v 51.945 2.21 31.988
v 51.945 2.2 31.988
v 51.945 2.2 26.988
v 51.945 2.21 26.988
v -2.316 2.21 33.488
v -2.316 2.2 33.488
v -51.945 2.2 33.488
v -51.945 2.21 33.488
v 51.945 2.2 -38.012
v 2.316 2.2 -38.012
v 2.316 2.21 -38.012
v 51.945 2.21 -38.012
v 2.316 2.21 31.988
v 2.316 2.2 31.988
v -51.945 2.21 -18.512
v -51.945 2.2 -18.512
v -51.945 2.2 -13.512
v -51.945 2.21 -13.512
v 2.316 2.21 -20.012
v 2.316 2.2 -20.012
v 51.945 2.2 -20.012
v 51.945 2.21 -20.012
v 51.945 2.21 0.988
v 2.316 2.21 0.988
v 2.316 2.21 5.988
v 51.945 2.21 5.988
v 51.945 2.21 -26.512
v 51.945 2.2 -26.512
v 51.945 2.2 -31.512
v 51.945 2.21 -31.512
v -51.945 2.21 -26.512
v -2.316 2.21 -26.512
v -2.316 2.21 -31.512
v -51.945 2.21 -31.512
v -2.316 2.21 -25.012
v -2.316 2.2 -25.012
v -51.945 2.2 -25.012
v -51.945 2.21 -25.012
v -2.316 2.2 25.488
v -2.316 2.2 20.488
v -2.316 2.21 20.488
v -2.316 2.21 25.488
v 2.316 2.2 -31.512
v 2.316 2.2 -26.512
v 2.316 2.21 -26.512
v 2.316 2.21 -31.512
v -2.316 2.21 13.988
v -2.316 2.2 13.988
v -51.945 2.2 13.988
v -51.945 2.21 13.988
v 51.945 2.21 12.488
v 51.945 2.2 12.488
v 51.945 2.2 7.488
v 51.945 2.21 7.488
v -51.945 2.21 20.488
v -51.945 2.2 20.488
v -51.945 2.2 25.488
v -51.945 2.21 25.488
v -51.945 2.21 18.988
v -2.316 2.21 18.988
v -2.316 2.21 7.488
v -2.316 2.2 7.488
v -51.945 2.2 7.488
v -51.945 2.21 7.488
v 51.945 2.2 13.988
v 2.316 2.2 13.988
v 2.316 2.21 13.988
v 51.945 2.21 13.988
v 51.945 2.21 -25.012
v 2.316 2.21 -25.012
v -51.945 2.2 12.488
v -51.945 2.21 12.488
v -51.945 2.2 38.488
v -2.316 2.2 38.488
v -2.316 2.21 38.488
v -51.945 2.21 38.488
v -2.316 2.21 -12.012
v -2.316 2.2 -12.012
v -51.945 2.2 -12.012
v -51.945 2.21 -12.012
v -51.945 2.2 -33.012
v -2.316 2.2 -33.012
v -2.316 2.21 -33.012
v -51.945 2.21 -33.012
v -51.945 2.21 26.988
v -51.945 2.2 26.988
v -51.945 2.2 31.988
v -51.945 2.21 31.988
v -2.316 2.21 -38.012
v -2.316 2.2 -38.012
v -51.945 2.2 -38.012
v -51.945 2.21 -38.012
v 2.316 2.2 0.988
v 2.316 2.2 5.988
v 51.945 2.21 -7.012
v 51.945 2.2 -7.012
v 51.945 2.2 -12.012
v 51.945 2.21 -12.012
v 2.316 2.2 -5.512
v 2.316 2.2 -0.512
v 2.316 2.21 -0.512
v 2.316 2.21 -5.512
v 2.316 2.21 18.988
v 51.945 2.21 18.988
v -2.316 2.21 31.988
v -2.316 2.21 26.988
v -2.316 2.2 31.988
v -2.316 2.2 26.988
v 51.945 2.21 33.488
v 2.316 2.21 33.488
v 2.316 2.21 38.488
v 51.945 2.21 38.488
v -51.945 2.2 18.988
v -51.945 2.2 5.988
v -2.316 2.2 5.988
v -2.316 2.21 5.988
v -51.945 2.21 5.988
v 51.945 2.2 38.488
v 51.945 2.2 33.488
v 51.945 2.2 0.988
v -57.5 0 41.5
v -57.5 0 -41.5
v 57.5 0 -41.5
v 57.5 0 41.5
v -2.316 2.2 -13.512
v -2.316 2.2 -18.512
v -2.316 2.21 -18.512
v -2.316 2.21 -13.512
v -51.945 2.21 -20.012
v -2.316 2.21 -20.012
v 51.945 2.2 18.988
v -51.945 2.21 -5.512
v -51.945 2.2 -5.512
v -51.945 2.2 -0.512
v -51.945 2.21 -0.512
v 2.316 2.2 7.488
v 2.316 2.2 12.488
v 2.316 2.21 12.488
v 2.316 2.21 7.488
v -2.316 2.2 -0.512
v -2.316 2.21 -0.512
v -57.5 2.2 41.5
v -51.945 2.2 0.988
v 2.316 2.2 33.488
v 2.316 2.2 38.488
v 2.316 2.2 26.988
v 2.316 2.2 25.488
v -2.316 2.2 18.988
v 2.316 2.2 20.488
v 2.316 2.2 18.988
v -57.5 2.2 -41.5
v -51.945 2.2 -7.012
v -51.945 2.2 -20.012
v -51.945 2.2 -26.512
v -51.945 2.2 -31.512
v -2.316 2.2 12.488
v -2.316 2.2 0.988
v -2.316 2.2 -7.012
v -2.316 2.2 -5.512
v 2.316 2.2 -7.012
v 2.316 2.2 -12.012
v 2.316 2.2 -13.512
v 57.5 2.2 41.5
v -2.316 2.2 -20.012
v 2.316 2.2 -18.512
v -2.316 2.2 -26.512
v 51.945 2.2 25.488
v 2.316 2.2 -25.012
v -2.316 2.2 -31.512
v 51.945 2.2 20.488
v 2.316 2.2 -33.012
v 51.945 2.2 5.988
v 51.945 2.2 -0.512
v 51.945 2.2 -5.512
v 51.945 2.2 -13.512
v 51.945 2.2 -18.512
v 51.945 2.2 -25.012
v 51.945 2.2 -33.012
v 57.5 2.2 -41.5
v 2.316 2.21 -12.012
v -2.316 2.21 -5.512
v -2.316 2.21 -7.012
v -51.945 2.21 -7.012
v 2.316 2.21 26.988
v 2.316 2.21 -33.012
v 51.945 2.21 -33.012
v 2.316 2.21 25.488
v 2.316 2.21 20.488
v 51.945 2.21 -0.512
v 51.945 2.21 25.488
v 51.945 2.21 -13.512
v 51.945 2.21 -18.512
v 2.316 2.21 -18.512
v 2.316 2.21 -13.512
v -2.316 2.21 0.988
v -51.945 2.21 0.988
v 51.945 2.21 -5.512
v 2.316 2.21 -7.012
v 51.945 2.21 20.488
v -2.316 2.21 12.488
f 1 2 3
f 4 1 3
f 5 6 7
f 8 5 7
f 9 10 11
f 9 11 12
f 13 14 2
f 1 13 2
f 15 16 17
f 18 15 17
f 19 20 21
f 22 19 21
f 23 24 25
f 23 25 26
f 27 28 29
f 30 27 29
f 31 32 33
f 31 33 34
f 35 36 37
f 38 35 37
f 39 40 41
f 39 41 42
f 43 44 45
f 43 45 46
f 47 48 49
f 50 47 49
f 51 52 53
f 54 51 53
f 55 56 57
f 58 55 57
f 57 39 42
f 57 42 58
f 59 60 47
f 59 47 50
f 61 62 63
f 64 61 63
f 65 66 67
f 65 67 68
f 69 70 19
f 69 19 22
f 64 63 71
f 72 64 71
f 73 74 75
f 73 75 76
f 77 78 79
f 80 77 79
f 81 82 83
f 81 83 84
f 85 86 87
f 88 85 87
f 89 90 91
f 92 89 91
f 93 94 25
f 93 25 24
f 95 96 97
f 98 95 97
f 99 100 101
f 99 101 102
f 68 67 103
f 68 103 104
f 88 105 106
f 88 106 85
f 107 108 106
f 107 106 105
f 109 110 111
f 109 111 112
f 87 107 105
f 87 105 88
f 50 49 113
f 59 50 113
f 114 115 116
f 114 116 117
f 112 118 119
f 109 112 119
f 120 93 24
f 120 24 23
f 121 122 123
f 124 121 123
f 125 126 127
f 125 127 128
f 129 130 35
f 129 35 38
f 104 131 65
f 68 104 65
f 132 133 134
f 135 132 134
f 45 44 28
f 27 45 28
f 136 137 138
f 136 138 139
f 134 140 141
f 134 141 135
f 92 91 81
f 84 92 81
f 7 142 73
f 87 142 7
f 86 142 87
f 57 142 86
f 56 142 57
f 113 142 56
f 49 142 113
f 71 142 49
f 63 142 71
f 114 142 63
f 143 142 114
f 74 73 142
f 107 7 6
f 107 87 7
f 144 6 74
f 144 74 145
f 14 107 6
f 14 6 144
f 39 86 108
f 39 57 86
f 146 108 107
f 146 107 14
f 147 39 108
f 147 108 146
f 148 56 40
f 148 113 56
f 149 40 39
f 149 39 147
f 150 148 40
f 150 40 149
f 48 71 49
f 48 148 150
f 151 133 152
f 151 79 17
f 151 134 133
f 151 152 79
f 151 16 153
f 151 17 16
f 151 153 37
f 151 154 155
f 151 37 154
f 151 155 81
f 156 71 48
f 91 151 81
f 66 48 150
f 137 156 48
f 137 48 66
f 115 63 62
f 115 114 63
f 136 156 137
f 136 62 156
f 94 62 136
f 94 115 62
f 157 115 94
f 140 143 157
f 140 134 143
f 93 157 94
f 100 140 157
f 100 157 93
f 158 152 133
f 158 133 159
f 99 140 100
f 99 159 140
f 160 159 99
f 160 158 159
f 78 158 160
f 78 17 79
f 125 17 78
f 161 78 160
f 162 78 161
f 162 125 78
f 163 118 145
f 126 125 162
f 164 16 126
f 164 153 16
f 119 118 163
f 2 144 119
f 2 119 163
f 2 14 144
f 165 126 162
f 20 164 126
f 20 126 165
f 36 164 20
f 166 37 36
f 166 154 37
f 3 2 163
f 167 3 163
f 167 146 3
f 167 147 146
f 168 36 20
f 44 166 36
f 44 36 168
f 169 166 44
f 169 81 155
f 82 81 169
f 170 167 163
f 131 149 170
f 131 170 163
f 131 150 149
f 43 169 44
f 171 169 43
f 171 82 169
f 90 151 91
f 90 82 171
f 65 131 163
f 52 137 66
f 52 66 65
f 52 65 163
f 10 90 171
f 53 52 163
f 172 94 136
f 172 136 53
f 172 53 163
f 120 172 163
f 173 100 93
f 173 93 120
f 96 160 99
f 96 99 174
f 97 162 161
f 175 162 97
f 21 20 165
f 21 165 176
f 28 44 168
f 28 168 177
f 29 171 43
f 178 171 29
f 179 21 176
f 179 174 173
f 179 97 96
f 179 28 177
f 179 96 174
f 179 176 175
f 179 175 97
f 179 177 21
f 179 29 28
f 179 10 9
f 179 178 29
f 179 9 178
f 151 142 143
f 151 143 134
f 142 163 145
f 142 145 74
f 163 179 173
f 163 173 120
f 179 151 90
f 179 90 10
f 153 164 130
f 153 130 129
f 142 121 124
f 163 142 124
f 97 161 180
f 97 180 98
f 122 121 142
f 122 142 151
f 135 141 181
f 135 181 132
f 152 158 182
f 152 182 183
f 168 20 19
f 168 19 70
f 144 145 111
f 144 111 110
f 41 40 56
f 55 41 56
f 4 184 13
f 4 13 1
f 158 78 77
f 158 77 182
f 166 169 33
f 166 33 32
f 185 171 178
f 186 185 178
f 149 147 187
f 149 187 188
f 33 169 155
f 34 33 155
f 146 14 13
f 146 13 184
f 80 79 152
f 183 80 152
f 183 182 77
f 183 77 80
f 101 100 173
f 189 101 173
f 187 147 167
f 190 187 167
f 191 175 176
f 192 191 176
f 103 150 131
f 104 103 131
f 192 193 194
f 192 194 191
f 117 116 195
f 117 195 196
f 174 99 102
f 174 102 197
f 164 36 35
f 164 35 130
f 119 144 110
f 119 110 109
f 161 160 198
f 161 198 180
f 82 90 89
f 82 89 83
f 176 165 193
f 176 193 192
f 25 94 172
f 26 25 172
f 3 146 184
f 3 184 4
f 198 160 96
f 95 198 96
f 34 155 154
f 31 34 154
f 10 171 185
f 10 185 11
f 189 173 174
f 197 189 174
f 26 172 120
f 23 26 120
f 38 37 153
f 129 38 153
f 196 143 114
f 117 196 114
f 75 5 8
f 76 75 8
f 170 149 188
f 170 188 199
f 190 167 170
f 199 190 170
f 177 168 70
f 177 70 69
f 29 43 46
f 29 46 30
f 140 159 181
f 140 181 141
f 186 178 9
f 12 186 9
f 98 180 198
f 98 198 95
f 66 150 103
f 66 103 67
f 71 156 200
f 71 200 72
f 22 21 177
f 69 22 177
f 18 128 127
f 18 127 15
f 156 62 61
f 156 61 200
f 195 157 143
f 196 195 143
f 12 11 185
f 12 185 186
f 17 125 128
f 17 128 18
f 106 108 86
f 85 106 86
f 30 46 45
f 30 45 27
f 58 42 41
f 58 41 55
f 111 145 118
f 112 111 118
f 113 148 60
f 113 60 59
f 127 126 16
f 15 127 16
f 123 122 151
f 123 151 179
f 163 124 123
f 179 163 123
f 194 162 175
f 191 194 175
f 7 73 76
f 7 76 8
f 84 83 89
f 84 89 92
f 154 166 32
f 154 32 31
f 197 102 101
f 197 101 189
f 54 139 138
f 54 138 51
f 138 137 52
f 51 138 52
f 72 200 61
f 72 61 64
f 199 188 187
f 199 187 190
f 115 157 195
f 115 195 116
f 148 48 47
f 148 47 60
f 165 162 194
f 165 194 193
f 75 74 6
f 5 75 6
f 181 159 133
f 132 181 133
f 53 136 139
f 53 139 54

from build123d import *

# Parameters (mm, degrees)
SKETCH_1_W                = 115
SKETCH_1_H                = 83
EXTRUDE_1_DEPTH           = 2.2
SKETCH_2_W                = 49.628548445
SKETCH_2_H                = 5
EXTRUDE_2_DEPTH           = 0.01
PATTERN_LINEAR_1_COUNT    = 12
PATTERN_LINEAR_1_PITCH    = 6.5
MIRROR_1_COPY_1_SKETCH_W  = 49.628548445
MIRROR_1_COPY_1_SKETCH_H  = 5
MIRROR_1_COPY_1_DEPTH     = 0.01
MIRROR_1_COPY_2_SKETCH_W  = 49.628548445
MIRROR_1_COPY_2_SKETCH_H  = 5
MIRROR_1_COPY_2_DEPTH     = 0.01
MIRROR_1_COPY_3_SKETCH_W  = 49.628548445
MIRROR_1_COPY_3_SKETCH_H  = 5
MIRROR_1_COPY_3_DEPTH     = 0.01
MIRROR_1_COPY_4_SKETCH_W  = 49.628548445
MIRROR_1_COPY_4_SKETCH_H  = 5
MIRROR_1_COPY_4_DEPTH     = 0.01
MIRROR_1_COPY_5_SKETCH_W  = 49.628548445
MIRROR_1_COPY_5_SKETCH_H  = 5
MIRROR_1_COPY_5_DEPTH     = 0.01
MIRROR_1_COPY_6_SKETCH_W  = 49.628548445
MIRROR_1_COPY_6_SKETCH_H  = 5
MIRROR_1_COPY_6_DEPTH     = 0.01
MIRROR_1_COPY_7_SKETCH_W  = 49.628548445
MIRROR_1_COPY_7_SKETCH_H  = 5
MIRROR_1_COPY_7_DEPTH     = 0.01
MIRROR_1_COPY_8_SKETCH_W  = 49.628548445
MIRROR_1_COPY_8_SKETCH_H  = 5
MIRROR_1_COPY_8_DEPTH     = 0.01
MIRROR_1_COPY_9_SKETCH_W  = 49.628548445
MIRROR_1_COPY_9_SKETCH_H  = 5
MIRROR_1_COPY_9_DEPTH     = 0.01
MIRROR_1_COPY_10_SKETCH_W = 49.628548445
MIRROR_1_COPY_10_SKETCH_H = 5
MIRROR_1_COPY_10_DEPTH    = 0.01
MIRROR_1_COPY_11_SKETCH_W = 49.628548445
MIRROR_1_COPY_11_SKETCH_H = 5
MIRROR_1_COPY_11_DEPTH    = 0.01


with BuildPart() as part:
    # Эскиз1 → Бобышка-Вытянуть1 (new body)
    with BuildSketch(Plane(origin=(0, 0, 0), x_dir=(1, 0, 0), z_dir=(0, 1, 0))):
        Rectangle(SKETCH_1_W, SKETCH_1_H)
    extrude(amount=EXTRUDE_1_DEPTH)

    # Эскиз2 → Бобышка-Вытянуть2 (add)
    with BuildSketch(Plane(origin=(0, 2.2, 0), x_dir=(1, 0, 0), z_dir=(0, 1, 0))):
        with Locations((27.130748896, -35.988250825)):
            Rectangle(SKETCH_2_W, SKETCH_2_H)
    extrude_2 = extrude(amount=EXTRUDE_2_DEPTH)

    # Линейный массив1: Бобышка-Вытянуть2 ×12
    with Locations(*[(0, 0, -i * PATTERN_LINEAR_1_PITCH) for i in range(1, PATTERN_LINEAR_1_COUNT)]):
        add(extrude_2)

    # Зеркальное отражение1: Бобышка-Вытянуть2 across plane
    add(extrude_2.mirror(Plane(origin=(0, 0, 0), x_dir=(0, 0, 1), z_dir=(1, 0, 0))))

    # Зеркальное отражение1 copy 1 sketch → Зеркальное отражение1 copy 1 (add)
    with BuildSketch(Plane(origin=(0, 2.2, -6.5), x_dir=(-1, 0, 0), z_dir=(0, 1, 0))):
        with Locations((27.130748896, 35.988250825)):
            Rectangle(MIRROR_1_COPY_1_SKETCH_W, MIRROR_1_COPY_1_SKETCH_H)
    extrude(amount=MIRROR_1_COPY_1_DEPTH)

    # Зеркальное отражение1 copy 2 sketch → Зеркальное отражение1 copy 2 (add)
    with BuildSketch(Plane(origin=(0, 2.2, -13), x_dir=(-1, 0, 0), z_dir=(0, 1, 0))):
        with Locations((27.130748896, 35.988250825)):
            Rectangle(MIRROR_1_COPY_2_SKETCH_W, MIRROR_1_COPY_2_SKETCH_H)
    extrude(amount=MIRROR_1_COPY_2_DEPTH)

    # Зеркальное отражение1 copy 3 sketch → Зеркальное отражение1 copy 3 (add)
    with BuildSketch(Plane(origin=(0, 2.2, -19.5), x_dir=(-1, 0, 0), z_dir=(0, 1, 0))):
        with Locations((27.130748896, 35.988250825)):
            Rectangle(MIRROR_1_COPY_3_SKETCH_W, MIRROR_1_COPY_3_SKETCH_H)
    extrude(amount=MIRROR_1_COPY_3_DEPTH)

    # Зеркальное отражение1 copy 4 sketch → Зеркальное отражение1 copy 4 (add)
    with BuildSketch(Plane(origin=(0, 2.2, -26), x_dir=(-1, 0, 0), z_dir=(0, 1, 0))):
        with Locations((27.130748896, 35.988250825)):
            Rectangle(MIRROR_1_COPY_4_SKETCH_W, MIRROR_1_COPY_4_SKETCH_H)
    extrude(amount=MIRROR_1_COPY_4_DEPTH)

    # Зеркальное отражение1 copy 5 sketch → Зеркальное отражение1 copy 5 (add)
    with BuildSketch(Plane(origin=(0, 2.2, -32.5), x_dir=(-1, 0, 0), z_dir=(0, 1, 0))):
        with Locations((27.130748896, 35.988250825)):
            Rectangle(MIRROR_1_COPY_5_SKETCH_W, MIRROR_1_COPY_5_SKETCH_H)
    extrude(amount=MIRROR_1_COPY_5_DEPTH)

    # Зеркальное отражение1 copy 6 sketch → Зеркальное отражение1 copy 6 (add)
    with BuildSketch(Plane(origin=(0, 2.2, -39), x_dir=(-1, 0, 0), z_dir=(0, 1, 0))):
        with Locations((27.130748896, 35.988250825)):
            Rectangle(MIRROR_1_COPY_6_SKETCH_W, MIRROR_1_COPY_6_SKETCH_H)
    extrude(amount=MIRROR_1_COPY_6_DEPTH)

    # Зеркальное отражение1 copy 7 sketch → Зеркальное отражение1 copy 7 (add)
    with BuildSketch(Plane(origin=(0, 2.2, -45.5), x_dir=(-1, 0, 0), z_dir=(0, 1, 0))):
        with Locations((27.130748896, 35.988250825)):
            Rectangle(MIRROR_1_COPY_7_SKETCH_W, MIRROR_1_COPY_7_SKETCH_H)
    extrude(amount=MIRROR_1_COPY_7_DEPTH)

    # Зеркальное отражение1 copy 8 sketch → Зеркальное отражение1 copy 8 (add)
    with BuildSketch(Plane(origin=(0, 2.2, -52), x_dir=(-1, 0, 0), z_dir=(0, 1, 0))):
        with Locations((27.130748896, 35.988250825)):
            Rectangle(MIRROR_1_COPY_8_SKETCH_W, MIRROR_1_COPY_8_SKETCH_H)
    extrude(amount=MIRROR_1_COPY_8_DEPTH)

    # Зеркальное отражение1 copy 9 sketch → Зеркальное отражение1 copy 9 (add)
    with BuildSketch(Plane(origin=(0, 2.2, -58.5), x_dir=(-1, 0, 0), z_dir=(0, 1, 0))):
        with Locations((27.130748896, 35.988250825)):
            Rectangle(MIRROR_1_COPY_9_SKETCH_W, MIRROR_1_COPY_9_SKETCH_H)
    extrude(amount=MIRROR_1_COPY_9_DEPTH)

    # Зеркальное отражение1 copy 10 sketch → Зеркальное отражение1 copy 10 (add)
    with BuildSketch(Plane(origin=(0, 2.2, -65), x_dir=(-1, 0, 0), z_dir=(0, 1, 0))):
        with Locations((27.130748896, 35.988250825)):
            Rectangle(MIRROR_1_COPY_10_SKETCH_W, MIRROR_1_COPY_10_SKETCH_H)
    extrude(amount=MIRROR_1_COPY_10_DEPTH)

    # Зеркальное отражение1 copy 11 sketch → Зеркальное отражение1 copy 11 (add)
    with BuildSketch(Plane(origin=(0, 2.2, -71.5), x_dir=(-1, 0, 0), z_dir=(0, 1, 0))):
        with Locations((27.130748896, 35.988250825)):
            Rectangle(MIRROR_1_COPY_11_SKETCH_W, MIRROR_1_COPY_11_SKETCH_H)
    extrude(amount=MIRROR_1_COPY_11_DEPTH)


solid = part.part
